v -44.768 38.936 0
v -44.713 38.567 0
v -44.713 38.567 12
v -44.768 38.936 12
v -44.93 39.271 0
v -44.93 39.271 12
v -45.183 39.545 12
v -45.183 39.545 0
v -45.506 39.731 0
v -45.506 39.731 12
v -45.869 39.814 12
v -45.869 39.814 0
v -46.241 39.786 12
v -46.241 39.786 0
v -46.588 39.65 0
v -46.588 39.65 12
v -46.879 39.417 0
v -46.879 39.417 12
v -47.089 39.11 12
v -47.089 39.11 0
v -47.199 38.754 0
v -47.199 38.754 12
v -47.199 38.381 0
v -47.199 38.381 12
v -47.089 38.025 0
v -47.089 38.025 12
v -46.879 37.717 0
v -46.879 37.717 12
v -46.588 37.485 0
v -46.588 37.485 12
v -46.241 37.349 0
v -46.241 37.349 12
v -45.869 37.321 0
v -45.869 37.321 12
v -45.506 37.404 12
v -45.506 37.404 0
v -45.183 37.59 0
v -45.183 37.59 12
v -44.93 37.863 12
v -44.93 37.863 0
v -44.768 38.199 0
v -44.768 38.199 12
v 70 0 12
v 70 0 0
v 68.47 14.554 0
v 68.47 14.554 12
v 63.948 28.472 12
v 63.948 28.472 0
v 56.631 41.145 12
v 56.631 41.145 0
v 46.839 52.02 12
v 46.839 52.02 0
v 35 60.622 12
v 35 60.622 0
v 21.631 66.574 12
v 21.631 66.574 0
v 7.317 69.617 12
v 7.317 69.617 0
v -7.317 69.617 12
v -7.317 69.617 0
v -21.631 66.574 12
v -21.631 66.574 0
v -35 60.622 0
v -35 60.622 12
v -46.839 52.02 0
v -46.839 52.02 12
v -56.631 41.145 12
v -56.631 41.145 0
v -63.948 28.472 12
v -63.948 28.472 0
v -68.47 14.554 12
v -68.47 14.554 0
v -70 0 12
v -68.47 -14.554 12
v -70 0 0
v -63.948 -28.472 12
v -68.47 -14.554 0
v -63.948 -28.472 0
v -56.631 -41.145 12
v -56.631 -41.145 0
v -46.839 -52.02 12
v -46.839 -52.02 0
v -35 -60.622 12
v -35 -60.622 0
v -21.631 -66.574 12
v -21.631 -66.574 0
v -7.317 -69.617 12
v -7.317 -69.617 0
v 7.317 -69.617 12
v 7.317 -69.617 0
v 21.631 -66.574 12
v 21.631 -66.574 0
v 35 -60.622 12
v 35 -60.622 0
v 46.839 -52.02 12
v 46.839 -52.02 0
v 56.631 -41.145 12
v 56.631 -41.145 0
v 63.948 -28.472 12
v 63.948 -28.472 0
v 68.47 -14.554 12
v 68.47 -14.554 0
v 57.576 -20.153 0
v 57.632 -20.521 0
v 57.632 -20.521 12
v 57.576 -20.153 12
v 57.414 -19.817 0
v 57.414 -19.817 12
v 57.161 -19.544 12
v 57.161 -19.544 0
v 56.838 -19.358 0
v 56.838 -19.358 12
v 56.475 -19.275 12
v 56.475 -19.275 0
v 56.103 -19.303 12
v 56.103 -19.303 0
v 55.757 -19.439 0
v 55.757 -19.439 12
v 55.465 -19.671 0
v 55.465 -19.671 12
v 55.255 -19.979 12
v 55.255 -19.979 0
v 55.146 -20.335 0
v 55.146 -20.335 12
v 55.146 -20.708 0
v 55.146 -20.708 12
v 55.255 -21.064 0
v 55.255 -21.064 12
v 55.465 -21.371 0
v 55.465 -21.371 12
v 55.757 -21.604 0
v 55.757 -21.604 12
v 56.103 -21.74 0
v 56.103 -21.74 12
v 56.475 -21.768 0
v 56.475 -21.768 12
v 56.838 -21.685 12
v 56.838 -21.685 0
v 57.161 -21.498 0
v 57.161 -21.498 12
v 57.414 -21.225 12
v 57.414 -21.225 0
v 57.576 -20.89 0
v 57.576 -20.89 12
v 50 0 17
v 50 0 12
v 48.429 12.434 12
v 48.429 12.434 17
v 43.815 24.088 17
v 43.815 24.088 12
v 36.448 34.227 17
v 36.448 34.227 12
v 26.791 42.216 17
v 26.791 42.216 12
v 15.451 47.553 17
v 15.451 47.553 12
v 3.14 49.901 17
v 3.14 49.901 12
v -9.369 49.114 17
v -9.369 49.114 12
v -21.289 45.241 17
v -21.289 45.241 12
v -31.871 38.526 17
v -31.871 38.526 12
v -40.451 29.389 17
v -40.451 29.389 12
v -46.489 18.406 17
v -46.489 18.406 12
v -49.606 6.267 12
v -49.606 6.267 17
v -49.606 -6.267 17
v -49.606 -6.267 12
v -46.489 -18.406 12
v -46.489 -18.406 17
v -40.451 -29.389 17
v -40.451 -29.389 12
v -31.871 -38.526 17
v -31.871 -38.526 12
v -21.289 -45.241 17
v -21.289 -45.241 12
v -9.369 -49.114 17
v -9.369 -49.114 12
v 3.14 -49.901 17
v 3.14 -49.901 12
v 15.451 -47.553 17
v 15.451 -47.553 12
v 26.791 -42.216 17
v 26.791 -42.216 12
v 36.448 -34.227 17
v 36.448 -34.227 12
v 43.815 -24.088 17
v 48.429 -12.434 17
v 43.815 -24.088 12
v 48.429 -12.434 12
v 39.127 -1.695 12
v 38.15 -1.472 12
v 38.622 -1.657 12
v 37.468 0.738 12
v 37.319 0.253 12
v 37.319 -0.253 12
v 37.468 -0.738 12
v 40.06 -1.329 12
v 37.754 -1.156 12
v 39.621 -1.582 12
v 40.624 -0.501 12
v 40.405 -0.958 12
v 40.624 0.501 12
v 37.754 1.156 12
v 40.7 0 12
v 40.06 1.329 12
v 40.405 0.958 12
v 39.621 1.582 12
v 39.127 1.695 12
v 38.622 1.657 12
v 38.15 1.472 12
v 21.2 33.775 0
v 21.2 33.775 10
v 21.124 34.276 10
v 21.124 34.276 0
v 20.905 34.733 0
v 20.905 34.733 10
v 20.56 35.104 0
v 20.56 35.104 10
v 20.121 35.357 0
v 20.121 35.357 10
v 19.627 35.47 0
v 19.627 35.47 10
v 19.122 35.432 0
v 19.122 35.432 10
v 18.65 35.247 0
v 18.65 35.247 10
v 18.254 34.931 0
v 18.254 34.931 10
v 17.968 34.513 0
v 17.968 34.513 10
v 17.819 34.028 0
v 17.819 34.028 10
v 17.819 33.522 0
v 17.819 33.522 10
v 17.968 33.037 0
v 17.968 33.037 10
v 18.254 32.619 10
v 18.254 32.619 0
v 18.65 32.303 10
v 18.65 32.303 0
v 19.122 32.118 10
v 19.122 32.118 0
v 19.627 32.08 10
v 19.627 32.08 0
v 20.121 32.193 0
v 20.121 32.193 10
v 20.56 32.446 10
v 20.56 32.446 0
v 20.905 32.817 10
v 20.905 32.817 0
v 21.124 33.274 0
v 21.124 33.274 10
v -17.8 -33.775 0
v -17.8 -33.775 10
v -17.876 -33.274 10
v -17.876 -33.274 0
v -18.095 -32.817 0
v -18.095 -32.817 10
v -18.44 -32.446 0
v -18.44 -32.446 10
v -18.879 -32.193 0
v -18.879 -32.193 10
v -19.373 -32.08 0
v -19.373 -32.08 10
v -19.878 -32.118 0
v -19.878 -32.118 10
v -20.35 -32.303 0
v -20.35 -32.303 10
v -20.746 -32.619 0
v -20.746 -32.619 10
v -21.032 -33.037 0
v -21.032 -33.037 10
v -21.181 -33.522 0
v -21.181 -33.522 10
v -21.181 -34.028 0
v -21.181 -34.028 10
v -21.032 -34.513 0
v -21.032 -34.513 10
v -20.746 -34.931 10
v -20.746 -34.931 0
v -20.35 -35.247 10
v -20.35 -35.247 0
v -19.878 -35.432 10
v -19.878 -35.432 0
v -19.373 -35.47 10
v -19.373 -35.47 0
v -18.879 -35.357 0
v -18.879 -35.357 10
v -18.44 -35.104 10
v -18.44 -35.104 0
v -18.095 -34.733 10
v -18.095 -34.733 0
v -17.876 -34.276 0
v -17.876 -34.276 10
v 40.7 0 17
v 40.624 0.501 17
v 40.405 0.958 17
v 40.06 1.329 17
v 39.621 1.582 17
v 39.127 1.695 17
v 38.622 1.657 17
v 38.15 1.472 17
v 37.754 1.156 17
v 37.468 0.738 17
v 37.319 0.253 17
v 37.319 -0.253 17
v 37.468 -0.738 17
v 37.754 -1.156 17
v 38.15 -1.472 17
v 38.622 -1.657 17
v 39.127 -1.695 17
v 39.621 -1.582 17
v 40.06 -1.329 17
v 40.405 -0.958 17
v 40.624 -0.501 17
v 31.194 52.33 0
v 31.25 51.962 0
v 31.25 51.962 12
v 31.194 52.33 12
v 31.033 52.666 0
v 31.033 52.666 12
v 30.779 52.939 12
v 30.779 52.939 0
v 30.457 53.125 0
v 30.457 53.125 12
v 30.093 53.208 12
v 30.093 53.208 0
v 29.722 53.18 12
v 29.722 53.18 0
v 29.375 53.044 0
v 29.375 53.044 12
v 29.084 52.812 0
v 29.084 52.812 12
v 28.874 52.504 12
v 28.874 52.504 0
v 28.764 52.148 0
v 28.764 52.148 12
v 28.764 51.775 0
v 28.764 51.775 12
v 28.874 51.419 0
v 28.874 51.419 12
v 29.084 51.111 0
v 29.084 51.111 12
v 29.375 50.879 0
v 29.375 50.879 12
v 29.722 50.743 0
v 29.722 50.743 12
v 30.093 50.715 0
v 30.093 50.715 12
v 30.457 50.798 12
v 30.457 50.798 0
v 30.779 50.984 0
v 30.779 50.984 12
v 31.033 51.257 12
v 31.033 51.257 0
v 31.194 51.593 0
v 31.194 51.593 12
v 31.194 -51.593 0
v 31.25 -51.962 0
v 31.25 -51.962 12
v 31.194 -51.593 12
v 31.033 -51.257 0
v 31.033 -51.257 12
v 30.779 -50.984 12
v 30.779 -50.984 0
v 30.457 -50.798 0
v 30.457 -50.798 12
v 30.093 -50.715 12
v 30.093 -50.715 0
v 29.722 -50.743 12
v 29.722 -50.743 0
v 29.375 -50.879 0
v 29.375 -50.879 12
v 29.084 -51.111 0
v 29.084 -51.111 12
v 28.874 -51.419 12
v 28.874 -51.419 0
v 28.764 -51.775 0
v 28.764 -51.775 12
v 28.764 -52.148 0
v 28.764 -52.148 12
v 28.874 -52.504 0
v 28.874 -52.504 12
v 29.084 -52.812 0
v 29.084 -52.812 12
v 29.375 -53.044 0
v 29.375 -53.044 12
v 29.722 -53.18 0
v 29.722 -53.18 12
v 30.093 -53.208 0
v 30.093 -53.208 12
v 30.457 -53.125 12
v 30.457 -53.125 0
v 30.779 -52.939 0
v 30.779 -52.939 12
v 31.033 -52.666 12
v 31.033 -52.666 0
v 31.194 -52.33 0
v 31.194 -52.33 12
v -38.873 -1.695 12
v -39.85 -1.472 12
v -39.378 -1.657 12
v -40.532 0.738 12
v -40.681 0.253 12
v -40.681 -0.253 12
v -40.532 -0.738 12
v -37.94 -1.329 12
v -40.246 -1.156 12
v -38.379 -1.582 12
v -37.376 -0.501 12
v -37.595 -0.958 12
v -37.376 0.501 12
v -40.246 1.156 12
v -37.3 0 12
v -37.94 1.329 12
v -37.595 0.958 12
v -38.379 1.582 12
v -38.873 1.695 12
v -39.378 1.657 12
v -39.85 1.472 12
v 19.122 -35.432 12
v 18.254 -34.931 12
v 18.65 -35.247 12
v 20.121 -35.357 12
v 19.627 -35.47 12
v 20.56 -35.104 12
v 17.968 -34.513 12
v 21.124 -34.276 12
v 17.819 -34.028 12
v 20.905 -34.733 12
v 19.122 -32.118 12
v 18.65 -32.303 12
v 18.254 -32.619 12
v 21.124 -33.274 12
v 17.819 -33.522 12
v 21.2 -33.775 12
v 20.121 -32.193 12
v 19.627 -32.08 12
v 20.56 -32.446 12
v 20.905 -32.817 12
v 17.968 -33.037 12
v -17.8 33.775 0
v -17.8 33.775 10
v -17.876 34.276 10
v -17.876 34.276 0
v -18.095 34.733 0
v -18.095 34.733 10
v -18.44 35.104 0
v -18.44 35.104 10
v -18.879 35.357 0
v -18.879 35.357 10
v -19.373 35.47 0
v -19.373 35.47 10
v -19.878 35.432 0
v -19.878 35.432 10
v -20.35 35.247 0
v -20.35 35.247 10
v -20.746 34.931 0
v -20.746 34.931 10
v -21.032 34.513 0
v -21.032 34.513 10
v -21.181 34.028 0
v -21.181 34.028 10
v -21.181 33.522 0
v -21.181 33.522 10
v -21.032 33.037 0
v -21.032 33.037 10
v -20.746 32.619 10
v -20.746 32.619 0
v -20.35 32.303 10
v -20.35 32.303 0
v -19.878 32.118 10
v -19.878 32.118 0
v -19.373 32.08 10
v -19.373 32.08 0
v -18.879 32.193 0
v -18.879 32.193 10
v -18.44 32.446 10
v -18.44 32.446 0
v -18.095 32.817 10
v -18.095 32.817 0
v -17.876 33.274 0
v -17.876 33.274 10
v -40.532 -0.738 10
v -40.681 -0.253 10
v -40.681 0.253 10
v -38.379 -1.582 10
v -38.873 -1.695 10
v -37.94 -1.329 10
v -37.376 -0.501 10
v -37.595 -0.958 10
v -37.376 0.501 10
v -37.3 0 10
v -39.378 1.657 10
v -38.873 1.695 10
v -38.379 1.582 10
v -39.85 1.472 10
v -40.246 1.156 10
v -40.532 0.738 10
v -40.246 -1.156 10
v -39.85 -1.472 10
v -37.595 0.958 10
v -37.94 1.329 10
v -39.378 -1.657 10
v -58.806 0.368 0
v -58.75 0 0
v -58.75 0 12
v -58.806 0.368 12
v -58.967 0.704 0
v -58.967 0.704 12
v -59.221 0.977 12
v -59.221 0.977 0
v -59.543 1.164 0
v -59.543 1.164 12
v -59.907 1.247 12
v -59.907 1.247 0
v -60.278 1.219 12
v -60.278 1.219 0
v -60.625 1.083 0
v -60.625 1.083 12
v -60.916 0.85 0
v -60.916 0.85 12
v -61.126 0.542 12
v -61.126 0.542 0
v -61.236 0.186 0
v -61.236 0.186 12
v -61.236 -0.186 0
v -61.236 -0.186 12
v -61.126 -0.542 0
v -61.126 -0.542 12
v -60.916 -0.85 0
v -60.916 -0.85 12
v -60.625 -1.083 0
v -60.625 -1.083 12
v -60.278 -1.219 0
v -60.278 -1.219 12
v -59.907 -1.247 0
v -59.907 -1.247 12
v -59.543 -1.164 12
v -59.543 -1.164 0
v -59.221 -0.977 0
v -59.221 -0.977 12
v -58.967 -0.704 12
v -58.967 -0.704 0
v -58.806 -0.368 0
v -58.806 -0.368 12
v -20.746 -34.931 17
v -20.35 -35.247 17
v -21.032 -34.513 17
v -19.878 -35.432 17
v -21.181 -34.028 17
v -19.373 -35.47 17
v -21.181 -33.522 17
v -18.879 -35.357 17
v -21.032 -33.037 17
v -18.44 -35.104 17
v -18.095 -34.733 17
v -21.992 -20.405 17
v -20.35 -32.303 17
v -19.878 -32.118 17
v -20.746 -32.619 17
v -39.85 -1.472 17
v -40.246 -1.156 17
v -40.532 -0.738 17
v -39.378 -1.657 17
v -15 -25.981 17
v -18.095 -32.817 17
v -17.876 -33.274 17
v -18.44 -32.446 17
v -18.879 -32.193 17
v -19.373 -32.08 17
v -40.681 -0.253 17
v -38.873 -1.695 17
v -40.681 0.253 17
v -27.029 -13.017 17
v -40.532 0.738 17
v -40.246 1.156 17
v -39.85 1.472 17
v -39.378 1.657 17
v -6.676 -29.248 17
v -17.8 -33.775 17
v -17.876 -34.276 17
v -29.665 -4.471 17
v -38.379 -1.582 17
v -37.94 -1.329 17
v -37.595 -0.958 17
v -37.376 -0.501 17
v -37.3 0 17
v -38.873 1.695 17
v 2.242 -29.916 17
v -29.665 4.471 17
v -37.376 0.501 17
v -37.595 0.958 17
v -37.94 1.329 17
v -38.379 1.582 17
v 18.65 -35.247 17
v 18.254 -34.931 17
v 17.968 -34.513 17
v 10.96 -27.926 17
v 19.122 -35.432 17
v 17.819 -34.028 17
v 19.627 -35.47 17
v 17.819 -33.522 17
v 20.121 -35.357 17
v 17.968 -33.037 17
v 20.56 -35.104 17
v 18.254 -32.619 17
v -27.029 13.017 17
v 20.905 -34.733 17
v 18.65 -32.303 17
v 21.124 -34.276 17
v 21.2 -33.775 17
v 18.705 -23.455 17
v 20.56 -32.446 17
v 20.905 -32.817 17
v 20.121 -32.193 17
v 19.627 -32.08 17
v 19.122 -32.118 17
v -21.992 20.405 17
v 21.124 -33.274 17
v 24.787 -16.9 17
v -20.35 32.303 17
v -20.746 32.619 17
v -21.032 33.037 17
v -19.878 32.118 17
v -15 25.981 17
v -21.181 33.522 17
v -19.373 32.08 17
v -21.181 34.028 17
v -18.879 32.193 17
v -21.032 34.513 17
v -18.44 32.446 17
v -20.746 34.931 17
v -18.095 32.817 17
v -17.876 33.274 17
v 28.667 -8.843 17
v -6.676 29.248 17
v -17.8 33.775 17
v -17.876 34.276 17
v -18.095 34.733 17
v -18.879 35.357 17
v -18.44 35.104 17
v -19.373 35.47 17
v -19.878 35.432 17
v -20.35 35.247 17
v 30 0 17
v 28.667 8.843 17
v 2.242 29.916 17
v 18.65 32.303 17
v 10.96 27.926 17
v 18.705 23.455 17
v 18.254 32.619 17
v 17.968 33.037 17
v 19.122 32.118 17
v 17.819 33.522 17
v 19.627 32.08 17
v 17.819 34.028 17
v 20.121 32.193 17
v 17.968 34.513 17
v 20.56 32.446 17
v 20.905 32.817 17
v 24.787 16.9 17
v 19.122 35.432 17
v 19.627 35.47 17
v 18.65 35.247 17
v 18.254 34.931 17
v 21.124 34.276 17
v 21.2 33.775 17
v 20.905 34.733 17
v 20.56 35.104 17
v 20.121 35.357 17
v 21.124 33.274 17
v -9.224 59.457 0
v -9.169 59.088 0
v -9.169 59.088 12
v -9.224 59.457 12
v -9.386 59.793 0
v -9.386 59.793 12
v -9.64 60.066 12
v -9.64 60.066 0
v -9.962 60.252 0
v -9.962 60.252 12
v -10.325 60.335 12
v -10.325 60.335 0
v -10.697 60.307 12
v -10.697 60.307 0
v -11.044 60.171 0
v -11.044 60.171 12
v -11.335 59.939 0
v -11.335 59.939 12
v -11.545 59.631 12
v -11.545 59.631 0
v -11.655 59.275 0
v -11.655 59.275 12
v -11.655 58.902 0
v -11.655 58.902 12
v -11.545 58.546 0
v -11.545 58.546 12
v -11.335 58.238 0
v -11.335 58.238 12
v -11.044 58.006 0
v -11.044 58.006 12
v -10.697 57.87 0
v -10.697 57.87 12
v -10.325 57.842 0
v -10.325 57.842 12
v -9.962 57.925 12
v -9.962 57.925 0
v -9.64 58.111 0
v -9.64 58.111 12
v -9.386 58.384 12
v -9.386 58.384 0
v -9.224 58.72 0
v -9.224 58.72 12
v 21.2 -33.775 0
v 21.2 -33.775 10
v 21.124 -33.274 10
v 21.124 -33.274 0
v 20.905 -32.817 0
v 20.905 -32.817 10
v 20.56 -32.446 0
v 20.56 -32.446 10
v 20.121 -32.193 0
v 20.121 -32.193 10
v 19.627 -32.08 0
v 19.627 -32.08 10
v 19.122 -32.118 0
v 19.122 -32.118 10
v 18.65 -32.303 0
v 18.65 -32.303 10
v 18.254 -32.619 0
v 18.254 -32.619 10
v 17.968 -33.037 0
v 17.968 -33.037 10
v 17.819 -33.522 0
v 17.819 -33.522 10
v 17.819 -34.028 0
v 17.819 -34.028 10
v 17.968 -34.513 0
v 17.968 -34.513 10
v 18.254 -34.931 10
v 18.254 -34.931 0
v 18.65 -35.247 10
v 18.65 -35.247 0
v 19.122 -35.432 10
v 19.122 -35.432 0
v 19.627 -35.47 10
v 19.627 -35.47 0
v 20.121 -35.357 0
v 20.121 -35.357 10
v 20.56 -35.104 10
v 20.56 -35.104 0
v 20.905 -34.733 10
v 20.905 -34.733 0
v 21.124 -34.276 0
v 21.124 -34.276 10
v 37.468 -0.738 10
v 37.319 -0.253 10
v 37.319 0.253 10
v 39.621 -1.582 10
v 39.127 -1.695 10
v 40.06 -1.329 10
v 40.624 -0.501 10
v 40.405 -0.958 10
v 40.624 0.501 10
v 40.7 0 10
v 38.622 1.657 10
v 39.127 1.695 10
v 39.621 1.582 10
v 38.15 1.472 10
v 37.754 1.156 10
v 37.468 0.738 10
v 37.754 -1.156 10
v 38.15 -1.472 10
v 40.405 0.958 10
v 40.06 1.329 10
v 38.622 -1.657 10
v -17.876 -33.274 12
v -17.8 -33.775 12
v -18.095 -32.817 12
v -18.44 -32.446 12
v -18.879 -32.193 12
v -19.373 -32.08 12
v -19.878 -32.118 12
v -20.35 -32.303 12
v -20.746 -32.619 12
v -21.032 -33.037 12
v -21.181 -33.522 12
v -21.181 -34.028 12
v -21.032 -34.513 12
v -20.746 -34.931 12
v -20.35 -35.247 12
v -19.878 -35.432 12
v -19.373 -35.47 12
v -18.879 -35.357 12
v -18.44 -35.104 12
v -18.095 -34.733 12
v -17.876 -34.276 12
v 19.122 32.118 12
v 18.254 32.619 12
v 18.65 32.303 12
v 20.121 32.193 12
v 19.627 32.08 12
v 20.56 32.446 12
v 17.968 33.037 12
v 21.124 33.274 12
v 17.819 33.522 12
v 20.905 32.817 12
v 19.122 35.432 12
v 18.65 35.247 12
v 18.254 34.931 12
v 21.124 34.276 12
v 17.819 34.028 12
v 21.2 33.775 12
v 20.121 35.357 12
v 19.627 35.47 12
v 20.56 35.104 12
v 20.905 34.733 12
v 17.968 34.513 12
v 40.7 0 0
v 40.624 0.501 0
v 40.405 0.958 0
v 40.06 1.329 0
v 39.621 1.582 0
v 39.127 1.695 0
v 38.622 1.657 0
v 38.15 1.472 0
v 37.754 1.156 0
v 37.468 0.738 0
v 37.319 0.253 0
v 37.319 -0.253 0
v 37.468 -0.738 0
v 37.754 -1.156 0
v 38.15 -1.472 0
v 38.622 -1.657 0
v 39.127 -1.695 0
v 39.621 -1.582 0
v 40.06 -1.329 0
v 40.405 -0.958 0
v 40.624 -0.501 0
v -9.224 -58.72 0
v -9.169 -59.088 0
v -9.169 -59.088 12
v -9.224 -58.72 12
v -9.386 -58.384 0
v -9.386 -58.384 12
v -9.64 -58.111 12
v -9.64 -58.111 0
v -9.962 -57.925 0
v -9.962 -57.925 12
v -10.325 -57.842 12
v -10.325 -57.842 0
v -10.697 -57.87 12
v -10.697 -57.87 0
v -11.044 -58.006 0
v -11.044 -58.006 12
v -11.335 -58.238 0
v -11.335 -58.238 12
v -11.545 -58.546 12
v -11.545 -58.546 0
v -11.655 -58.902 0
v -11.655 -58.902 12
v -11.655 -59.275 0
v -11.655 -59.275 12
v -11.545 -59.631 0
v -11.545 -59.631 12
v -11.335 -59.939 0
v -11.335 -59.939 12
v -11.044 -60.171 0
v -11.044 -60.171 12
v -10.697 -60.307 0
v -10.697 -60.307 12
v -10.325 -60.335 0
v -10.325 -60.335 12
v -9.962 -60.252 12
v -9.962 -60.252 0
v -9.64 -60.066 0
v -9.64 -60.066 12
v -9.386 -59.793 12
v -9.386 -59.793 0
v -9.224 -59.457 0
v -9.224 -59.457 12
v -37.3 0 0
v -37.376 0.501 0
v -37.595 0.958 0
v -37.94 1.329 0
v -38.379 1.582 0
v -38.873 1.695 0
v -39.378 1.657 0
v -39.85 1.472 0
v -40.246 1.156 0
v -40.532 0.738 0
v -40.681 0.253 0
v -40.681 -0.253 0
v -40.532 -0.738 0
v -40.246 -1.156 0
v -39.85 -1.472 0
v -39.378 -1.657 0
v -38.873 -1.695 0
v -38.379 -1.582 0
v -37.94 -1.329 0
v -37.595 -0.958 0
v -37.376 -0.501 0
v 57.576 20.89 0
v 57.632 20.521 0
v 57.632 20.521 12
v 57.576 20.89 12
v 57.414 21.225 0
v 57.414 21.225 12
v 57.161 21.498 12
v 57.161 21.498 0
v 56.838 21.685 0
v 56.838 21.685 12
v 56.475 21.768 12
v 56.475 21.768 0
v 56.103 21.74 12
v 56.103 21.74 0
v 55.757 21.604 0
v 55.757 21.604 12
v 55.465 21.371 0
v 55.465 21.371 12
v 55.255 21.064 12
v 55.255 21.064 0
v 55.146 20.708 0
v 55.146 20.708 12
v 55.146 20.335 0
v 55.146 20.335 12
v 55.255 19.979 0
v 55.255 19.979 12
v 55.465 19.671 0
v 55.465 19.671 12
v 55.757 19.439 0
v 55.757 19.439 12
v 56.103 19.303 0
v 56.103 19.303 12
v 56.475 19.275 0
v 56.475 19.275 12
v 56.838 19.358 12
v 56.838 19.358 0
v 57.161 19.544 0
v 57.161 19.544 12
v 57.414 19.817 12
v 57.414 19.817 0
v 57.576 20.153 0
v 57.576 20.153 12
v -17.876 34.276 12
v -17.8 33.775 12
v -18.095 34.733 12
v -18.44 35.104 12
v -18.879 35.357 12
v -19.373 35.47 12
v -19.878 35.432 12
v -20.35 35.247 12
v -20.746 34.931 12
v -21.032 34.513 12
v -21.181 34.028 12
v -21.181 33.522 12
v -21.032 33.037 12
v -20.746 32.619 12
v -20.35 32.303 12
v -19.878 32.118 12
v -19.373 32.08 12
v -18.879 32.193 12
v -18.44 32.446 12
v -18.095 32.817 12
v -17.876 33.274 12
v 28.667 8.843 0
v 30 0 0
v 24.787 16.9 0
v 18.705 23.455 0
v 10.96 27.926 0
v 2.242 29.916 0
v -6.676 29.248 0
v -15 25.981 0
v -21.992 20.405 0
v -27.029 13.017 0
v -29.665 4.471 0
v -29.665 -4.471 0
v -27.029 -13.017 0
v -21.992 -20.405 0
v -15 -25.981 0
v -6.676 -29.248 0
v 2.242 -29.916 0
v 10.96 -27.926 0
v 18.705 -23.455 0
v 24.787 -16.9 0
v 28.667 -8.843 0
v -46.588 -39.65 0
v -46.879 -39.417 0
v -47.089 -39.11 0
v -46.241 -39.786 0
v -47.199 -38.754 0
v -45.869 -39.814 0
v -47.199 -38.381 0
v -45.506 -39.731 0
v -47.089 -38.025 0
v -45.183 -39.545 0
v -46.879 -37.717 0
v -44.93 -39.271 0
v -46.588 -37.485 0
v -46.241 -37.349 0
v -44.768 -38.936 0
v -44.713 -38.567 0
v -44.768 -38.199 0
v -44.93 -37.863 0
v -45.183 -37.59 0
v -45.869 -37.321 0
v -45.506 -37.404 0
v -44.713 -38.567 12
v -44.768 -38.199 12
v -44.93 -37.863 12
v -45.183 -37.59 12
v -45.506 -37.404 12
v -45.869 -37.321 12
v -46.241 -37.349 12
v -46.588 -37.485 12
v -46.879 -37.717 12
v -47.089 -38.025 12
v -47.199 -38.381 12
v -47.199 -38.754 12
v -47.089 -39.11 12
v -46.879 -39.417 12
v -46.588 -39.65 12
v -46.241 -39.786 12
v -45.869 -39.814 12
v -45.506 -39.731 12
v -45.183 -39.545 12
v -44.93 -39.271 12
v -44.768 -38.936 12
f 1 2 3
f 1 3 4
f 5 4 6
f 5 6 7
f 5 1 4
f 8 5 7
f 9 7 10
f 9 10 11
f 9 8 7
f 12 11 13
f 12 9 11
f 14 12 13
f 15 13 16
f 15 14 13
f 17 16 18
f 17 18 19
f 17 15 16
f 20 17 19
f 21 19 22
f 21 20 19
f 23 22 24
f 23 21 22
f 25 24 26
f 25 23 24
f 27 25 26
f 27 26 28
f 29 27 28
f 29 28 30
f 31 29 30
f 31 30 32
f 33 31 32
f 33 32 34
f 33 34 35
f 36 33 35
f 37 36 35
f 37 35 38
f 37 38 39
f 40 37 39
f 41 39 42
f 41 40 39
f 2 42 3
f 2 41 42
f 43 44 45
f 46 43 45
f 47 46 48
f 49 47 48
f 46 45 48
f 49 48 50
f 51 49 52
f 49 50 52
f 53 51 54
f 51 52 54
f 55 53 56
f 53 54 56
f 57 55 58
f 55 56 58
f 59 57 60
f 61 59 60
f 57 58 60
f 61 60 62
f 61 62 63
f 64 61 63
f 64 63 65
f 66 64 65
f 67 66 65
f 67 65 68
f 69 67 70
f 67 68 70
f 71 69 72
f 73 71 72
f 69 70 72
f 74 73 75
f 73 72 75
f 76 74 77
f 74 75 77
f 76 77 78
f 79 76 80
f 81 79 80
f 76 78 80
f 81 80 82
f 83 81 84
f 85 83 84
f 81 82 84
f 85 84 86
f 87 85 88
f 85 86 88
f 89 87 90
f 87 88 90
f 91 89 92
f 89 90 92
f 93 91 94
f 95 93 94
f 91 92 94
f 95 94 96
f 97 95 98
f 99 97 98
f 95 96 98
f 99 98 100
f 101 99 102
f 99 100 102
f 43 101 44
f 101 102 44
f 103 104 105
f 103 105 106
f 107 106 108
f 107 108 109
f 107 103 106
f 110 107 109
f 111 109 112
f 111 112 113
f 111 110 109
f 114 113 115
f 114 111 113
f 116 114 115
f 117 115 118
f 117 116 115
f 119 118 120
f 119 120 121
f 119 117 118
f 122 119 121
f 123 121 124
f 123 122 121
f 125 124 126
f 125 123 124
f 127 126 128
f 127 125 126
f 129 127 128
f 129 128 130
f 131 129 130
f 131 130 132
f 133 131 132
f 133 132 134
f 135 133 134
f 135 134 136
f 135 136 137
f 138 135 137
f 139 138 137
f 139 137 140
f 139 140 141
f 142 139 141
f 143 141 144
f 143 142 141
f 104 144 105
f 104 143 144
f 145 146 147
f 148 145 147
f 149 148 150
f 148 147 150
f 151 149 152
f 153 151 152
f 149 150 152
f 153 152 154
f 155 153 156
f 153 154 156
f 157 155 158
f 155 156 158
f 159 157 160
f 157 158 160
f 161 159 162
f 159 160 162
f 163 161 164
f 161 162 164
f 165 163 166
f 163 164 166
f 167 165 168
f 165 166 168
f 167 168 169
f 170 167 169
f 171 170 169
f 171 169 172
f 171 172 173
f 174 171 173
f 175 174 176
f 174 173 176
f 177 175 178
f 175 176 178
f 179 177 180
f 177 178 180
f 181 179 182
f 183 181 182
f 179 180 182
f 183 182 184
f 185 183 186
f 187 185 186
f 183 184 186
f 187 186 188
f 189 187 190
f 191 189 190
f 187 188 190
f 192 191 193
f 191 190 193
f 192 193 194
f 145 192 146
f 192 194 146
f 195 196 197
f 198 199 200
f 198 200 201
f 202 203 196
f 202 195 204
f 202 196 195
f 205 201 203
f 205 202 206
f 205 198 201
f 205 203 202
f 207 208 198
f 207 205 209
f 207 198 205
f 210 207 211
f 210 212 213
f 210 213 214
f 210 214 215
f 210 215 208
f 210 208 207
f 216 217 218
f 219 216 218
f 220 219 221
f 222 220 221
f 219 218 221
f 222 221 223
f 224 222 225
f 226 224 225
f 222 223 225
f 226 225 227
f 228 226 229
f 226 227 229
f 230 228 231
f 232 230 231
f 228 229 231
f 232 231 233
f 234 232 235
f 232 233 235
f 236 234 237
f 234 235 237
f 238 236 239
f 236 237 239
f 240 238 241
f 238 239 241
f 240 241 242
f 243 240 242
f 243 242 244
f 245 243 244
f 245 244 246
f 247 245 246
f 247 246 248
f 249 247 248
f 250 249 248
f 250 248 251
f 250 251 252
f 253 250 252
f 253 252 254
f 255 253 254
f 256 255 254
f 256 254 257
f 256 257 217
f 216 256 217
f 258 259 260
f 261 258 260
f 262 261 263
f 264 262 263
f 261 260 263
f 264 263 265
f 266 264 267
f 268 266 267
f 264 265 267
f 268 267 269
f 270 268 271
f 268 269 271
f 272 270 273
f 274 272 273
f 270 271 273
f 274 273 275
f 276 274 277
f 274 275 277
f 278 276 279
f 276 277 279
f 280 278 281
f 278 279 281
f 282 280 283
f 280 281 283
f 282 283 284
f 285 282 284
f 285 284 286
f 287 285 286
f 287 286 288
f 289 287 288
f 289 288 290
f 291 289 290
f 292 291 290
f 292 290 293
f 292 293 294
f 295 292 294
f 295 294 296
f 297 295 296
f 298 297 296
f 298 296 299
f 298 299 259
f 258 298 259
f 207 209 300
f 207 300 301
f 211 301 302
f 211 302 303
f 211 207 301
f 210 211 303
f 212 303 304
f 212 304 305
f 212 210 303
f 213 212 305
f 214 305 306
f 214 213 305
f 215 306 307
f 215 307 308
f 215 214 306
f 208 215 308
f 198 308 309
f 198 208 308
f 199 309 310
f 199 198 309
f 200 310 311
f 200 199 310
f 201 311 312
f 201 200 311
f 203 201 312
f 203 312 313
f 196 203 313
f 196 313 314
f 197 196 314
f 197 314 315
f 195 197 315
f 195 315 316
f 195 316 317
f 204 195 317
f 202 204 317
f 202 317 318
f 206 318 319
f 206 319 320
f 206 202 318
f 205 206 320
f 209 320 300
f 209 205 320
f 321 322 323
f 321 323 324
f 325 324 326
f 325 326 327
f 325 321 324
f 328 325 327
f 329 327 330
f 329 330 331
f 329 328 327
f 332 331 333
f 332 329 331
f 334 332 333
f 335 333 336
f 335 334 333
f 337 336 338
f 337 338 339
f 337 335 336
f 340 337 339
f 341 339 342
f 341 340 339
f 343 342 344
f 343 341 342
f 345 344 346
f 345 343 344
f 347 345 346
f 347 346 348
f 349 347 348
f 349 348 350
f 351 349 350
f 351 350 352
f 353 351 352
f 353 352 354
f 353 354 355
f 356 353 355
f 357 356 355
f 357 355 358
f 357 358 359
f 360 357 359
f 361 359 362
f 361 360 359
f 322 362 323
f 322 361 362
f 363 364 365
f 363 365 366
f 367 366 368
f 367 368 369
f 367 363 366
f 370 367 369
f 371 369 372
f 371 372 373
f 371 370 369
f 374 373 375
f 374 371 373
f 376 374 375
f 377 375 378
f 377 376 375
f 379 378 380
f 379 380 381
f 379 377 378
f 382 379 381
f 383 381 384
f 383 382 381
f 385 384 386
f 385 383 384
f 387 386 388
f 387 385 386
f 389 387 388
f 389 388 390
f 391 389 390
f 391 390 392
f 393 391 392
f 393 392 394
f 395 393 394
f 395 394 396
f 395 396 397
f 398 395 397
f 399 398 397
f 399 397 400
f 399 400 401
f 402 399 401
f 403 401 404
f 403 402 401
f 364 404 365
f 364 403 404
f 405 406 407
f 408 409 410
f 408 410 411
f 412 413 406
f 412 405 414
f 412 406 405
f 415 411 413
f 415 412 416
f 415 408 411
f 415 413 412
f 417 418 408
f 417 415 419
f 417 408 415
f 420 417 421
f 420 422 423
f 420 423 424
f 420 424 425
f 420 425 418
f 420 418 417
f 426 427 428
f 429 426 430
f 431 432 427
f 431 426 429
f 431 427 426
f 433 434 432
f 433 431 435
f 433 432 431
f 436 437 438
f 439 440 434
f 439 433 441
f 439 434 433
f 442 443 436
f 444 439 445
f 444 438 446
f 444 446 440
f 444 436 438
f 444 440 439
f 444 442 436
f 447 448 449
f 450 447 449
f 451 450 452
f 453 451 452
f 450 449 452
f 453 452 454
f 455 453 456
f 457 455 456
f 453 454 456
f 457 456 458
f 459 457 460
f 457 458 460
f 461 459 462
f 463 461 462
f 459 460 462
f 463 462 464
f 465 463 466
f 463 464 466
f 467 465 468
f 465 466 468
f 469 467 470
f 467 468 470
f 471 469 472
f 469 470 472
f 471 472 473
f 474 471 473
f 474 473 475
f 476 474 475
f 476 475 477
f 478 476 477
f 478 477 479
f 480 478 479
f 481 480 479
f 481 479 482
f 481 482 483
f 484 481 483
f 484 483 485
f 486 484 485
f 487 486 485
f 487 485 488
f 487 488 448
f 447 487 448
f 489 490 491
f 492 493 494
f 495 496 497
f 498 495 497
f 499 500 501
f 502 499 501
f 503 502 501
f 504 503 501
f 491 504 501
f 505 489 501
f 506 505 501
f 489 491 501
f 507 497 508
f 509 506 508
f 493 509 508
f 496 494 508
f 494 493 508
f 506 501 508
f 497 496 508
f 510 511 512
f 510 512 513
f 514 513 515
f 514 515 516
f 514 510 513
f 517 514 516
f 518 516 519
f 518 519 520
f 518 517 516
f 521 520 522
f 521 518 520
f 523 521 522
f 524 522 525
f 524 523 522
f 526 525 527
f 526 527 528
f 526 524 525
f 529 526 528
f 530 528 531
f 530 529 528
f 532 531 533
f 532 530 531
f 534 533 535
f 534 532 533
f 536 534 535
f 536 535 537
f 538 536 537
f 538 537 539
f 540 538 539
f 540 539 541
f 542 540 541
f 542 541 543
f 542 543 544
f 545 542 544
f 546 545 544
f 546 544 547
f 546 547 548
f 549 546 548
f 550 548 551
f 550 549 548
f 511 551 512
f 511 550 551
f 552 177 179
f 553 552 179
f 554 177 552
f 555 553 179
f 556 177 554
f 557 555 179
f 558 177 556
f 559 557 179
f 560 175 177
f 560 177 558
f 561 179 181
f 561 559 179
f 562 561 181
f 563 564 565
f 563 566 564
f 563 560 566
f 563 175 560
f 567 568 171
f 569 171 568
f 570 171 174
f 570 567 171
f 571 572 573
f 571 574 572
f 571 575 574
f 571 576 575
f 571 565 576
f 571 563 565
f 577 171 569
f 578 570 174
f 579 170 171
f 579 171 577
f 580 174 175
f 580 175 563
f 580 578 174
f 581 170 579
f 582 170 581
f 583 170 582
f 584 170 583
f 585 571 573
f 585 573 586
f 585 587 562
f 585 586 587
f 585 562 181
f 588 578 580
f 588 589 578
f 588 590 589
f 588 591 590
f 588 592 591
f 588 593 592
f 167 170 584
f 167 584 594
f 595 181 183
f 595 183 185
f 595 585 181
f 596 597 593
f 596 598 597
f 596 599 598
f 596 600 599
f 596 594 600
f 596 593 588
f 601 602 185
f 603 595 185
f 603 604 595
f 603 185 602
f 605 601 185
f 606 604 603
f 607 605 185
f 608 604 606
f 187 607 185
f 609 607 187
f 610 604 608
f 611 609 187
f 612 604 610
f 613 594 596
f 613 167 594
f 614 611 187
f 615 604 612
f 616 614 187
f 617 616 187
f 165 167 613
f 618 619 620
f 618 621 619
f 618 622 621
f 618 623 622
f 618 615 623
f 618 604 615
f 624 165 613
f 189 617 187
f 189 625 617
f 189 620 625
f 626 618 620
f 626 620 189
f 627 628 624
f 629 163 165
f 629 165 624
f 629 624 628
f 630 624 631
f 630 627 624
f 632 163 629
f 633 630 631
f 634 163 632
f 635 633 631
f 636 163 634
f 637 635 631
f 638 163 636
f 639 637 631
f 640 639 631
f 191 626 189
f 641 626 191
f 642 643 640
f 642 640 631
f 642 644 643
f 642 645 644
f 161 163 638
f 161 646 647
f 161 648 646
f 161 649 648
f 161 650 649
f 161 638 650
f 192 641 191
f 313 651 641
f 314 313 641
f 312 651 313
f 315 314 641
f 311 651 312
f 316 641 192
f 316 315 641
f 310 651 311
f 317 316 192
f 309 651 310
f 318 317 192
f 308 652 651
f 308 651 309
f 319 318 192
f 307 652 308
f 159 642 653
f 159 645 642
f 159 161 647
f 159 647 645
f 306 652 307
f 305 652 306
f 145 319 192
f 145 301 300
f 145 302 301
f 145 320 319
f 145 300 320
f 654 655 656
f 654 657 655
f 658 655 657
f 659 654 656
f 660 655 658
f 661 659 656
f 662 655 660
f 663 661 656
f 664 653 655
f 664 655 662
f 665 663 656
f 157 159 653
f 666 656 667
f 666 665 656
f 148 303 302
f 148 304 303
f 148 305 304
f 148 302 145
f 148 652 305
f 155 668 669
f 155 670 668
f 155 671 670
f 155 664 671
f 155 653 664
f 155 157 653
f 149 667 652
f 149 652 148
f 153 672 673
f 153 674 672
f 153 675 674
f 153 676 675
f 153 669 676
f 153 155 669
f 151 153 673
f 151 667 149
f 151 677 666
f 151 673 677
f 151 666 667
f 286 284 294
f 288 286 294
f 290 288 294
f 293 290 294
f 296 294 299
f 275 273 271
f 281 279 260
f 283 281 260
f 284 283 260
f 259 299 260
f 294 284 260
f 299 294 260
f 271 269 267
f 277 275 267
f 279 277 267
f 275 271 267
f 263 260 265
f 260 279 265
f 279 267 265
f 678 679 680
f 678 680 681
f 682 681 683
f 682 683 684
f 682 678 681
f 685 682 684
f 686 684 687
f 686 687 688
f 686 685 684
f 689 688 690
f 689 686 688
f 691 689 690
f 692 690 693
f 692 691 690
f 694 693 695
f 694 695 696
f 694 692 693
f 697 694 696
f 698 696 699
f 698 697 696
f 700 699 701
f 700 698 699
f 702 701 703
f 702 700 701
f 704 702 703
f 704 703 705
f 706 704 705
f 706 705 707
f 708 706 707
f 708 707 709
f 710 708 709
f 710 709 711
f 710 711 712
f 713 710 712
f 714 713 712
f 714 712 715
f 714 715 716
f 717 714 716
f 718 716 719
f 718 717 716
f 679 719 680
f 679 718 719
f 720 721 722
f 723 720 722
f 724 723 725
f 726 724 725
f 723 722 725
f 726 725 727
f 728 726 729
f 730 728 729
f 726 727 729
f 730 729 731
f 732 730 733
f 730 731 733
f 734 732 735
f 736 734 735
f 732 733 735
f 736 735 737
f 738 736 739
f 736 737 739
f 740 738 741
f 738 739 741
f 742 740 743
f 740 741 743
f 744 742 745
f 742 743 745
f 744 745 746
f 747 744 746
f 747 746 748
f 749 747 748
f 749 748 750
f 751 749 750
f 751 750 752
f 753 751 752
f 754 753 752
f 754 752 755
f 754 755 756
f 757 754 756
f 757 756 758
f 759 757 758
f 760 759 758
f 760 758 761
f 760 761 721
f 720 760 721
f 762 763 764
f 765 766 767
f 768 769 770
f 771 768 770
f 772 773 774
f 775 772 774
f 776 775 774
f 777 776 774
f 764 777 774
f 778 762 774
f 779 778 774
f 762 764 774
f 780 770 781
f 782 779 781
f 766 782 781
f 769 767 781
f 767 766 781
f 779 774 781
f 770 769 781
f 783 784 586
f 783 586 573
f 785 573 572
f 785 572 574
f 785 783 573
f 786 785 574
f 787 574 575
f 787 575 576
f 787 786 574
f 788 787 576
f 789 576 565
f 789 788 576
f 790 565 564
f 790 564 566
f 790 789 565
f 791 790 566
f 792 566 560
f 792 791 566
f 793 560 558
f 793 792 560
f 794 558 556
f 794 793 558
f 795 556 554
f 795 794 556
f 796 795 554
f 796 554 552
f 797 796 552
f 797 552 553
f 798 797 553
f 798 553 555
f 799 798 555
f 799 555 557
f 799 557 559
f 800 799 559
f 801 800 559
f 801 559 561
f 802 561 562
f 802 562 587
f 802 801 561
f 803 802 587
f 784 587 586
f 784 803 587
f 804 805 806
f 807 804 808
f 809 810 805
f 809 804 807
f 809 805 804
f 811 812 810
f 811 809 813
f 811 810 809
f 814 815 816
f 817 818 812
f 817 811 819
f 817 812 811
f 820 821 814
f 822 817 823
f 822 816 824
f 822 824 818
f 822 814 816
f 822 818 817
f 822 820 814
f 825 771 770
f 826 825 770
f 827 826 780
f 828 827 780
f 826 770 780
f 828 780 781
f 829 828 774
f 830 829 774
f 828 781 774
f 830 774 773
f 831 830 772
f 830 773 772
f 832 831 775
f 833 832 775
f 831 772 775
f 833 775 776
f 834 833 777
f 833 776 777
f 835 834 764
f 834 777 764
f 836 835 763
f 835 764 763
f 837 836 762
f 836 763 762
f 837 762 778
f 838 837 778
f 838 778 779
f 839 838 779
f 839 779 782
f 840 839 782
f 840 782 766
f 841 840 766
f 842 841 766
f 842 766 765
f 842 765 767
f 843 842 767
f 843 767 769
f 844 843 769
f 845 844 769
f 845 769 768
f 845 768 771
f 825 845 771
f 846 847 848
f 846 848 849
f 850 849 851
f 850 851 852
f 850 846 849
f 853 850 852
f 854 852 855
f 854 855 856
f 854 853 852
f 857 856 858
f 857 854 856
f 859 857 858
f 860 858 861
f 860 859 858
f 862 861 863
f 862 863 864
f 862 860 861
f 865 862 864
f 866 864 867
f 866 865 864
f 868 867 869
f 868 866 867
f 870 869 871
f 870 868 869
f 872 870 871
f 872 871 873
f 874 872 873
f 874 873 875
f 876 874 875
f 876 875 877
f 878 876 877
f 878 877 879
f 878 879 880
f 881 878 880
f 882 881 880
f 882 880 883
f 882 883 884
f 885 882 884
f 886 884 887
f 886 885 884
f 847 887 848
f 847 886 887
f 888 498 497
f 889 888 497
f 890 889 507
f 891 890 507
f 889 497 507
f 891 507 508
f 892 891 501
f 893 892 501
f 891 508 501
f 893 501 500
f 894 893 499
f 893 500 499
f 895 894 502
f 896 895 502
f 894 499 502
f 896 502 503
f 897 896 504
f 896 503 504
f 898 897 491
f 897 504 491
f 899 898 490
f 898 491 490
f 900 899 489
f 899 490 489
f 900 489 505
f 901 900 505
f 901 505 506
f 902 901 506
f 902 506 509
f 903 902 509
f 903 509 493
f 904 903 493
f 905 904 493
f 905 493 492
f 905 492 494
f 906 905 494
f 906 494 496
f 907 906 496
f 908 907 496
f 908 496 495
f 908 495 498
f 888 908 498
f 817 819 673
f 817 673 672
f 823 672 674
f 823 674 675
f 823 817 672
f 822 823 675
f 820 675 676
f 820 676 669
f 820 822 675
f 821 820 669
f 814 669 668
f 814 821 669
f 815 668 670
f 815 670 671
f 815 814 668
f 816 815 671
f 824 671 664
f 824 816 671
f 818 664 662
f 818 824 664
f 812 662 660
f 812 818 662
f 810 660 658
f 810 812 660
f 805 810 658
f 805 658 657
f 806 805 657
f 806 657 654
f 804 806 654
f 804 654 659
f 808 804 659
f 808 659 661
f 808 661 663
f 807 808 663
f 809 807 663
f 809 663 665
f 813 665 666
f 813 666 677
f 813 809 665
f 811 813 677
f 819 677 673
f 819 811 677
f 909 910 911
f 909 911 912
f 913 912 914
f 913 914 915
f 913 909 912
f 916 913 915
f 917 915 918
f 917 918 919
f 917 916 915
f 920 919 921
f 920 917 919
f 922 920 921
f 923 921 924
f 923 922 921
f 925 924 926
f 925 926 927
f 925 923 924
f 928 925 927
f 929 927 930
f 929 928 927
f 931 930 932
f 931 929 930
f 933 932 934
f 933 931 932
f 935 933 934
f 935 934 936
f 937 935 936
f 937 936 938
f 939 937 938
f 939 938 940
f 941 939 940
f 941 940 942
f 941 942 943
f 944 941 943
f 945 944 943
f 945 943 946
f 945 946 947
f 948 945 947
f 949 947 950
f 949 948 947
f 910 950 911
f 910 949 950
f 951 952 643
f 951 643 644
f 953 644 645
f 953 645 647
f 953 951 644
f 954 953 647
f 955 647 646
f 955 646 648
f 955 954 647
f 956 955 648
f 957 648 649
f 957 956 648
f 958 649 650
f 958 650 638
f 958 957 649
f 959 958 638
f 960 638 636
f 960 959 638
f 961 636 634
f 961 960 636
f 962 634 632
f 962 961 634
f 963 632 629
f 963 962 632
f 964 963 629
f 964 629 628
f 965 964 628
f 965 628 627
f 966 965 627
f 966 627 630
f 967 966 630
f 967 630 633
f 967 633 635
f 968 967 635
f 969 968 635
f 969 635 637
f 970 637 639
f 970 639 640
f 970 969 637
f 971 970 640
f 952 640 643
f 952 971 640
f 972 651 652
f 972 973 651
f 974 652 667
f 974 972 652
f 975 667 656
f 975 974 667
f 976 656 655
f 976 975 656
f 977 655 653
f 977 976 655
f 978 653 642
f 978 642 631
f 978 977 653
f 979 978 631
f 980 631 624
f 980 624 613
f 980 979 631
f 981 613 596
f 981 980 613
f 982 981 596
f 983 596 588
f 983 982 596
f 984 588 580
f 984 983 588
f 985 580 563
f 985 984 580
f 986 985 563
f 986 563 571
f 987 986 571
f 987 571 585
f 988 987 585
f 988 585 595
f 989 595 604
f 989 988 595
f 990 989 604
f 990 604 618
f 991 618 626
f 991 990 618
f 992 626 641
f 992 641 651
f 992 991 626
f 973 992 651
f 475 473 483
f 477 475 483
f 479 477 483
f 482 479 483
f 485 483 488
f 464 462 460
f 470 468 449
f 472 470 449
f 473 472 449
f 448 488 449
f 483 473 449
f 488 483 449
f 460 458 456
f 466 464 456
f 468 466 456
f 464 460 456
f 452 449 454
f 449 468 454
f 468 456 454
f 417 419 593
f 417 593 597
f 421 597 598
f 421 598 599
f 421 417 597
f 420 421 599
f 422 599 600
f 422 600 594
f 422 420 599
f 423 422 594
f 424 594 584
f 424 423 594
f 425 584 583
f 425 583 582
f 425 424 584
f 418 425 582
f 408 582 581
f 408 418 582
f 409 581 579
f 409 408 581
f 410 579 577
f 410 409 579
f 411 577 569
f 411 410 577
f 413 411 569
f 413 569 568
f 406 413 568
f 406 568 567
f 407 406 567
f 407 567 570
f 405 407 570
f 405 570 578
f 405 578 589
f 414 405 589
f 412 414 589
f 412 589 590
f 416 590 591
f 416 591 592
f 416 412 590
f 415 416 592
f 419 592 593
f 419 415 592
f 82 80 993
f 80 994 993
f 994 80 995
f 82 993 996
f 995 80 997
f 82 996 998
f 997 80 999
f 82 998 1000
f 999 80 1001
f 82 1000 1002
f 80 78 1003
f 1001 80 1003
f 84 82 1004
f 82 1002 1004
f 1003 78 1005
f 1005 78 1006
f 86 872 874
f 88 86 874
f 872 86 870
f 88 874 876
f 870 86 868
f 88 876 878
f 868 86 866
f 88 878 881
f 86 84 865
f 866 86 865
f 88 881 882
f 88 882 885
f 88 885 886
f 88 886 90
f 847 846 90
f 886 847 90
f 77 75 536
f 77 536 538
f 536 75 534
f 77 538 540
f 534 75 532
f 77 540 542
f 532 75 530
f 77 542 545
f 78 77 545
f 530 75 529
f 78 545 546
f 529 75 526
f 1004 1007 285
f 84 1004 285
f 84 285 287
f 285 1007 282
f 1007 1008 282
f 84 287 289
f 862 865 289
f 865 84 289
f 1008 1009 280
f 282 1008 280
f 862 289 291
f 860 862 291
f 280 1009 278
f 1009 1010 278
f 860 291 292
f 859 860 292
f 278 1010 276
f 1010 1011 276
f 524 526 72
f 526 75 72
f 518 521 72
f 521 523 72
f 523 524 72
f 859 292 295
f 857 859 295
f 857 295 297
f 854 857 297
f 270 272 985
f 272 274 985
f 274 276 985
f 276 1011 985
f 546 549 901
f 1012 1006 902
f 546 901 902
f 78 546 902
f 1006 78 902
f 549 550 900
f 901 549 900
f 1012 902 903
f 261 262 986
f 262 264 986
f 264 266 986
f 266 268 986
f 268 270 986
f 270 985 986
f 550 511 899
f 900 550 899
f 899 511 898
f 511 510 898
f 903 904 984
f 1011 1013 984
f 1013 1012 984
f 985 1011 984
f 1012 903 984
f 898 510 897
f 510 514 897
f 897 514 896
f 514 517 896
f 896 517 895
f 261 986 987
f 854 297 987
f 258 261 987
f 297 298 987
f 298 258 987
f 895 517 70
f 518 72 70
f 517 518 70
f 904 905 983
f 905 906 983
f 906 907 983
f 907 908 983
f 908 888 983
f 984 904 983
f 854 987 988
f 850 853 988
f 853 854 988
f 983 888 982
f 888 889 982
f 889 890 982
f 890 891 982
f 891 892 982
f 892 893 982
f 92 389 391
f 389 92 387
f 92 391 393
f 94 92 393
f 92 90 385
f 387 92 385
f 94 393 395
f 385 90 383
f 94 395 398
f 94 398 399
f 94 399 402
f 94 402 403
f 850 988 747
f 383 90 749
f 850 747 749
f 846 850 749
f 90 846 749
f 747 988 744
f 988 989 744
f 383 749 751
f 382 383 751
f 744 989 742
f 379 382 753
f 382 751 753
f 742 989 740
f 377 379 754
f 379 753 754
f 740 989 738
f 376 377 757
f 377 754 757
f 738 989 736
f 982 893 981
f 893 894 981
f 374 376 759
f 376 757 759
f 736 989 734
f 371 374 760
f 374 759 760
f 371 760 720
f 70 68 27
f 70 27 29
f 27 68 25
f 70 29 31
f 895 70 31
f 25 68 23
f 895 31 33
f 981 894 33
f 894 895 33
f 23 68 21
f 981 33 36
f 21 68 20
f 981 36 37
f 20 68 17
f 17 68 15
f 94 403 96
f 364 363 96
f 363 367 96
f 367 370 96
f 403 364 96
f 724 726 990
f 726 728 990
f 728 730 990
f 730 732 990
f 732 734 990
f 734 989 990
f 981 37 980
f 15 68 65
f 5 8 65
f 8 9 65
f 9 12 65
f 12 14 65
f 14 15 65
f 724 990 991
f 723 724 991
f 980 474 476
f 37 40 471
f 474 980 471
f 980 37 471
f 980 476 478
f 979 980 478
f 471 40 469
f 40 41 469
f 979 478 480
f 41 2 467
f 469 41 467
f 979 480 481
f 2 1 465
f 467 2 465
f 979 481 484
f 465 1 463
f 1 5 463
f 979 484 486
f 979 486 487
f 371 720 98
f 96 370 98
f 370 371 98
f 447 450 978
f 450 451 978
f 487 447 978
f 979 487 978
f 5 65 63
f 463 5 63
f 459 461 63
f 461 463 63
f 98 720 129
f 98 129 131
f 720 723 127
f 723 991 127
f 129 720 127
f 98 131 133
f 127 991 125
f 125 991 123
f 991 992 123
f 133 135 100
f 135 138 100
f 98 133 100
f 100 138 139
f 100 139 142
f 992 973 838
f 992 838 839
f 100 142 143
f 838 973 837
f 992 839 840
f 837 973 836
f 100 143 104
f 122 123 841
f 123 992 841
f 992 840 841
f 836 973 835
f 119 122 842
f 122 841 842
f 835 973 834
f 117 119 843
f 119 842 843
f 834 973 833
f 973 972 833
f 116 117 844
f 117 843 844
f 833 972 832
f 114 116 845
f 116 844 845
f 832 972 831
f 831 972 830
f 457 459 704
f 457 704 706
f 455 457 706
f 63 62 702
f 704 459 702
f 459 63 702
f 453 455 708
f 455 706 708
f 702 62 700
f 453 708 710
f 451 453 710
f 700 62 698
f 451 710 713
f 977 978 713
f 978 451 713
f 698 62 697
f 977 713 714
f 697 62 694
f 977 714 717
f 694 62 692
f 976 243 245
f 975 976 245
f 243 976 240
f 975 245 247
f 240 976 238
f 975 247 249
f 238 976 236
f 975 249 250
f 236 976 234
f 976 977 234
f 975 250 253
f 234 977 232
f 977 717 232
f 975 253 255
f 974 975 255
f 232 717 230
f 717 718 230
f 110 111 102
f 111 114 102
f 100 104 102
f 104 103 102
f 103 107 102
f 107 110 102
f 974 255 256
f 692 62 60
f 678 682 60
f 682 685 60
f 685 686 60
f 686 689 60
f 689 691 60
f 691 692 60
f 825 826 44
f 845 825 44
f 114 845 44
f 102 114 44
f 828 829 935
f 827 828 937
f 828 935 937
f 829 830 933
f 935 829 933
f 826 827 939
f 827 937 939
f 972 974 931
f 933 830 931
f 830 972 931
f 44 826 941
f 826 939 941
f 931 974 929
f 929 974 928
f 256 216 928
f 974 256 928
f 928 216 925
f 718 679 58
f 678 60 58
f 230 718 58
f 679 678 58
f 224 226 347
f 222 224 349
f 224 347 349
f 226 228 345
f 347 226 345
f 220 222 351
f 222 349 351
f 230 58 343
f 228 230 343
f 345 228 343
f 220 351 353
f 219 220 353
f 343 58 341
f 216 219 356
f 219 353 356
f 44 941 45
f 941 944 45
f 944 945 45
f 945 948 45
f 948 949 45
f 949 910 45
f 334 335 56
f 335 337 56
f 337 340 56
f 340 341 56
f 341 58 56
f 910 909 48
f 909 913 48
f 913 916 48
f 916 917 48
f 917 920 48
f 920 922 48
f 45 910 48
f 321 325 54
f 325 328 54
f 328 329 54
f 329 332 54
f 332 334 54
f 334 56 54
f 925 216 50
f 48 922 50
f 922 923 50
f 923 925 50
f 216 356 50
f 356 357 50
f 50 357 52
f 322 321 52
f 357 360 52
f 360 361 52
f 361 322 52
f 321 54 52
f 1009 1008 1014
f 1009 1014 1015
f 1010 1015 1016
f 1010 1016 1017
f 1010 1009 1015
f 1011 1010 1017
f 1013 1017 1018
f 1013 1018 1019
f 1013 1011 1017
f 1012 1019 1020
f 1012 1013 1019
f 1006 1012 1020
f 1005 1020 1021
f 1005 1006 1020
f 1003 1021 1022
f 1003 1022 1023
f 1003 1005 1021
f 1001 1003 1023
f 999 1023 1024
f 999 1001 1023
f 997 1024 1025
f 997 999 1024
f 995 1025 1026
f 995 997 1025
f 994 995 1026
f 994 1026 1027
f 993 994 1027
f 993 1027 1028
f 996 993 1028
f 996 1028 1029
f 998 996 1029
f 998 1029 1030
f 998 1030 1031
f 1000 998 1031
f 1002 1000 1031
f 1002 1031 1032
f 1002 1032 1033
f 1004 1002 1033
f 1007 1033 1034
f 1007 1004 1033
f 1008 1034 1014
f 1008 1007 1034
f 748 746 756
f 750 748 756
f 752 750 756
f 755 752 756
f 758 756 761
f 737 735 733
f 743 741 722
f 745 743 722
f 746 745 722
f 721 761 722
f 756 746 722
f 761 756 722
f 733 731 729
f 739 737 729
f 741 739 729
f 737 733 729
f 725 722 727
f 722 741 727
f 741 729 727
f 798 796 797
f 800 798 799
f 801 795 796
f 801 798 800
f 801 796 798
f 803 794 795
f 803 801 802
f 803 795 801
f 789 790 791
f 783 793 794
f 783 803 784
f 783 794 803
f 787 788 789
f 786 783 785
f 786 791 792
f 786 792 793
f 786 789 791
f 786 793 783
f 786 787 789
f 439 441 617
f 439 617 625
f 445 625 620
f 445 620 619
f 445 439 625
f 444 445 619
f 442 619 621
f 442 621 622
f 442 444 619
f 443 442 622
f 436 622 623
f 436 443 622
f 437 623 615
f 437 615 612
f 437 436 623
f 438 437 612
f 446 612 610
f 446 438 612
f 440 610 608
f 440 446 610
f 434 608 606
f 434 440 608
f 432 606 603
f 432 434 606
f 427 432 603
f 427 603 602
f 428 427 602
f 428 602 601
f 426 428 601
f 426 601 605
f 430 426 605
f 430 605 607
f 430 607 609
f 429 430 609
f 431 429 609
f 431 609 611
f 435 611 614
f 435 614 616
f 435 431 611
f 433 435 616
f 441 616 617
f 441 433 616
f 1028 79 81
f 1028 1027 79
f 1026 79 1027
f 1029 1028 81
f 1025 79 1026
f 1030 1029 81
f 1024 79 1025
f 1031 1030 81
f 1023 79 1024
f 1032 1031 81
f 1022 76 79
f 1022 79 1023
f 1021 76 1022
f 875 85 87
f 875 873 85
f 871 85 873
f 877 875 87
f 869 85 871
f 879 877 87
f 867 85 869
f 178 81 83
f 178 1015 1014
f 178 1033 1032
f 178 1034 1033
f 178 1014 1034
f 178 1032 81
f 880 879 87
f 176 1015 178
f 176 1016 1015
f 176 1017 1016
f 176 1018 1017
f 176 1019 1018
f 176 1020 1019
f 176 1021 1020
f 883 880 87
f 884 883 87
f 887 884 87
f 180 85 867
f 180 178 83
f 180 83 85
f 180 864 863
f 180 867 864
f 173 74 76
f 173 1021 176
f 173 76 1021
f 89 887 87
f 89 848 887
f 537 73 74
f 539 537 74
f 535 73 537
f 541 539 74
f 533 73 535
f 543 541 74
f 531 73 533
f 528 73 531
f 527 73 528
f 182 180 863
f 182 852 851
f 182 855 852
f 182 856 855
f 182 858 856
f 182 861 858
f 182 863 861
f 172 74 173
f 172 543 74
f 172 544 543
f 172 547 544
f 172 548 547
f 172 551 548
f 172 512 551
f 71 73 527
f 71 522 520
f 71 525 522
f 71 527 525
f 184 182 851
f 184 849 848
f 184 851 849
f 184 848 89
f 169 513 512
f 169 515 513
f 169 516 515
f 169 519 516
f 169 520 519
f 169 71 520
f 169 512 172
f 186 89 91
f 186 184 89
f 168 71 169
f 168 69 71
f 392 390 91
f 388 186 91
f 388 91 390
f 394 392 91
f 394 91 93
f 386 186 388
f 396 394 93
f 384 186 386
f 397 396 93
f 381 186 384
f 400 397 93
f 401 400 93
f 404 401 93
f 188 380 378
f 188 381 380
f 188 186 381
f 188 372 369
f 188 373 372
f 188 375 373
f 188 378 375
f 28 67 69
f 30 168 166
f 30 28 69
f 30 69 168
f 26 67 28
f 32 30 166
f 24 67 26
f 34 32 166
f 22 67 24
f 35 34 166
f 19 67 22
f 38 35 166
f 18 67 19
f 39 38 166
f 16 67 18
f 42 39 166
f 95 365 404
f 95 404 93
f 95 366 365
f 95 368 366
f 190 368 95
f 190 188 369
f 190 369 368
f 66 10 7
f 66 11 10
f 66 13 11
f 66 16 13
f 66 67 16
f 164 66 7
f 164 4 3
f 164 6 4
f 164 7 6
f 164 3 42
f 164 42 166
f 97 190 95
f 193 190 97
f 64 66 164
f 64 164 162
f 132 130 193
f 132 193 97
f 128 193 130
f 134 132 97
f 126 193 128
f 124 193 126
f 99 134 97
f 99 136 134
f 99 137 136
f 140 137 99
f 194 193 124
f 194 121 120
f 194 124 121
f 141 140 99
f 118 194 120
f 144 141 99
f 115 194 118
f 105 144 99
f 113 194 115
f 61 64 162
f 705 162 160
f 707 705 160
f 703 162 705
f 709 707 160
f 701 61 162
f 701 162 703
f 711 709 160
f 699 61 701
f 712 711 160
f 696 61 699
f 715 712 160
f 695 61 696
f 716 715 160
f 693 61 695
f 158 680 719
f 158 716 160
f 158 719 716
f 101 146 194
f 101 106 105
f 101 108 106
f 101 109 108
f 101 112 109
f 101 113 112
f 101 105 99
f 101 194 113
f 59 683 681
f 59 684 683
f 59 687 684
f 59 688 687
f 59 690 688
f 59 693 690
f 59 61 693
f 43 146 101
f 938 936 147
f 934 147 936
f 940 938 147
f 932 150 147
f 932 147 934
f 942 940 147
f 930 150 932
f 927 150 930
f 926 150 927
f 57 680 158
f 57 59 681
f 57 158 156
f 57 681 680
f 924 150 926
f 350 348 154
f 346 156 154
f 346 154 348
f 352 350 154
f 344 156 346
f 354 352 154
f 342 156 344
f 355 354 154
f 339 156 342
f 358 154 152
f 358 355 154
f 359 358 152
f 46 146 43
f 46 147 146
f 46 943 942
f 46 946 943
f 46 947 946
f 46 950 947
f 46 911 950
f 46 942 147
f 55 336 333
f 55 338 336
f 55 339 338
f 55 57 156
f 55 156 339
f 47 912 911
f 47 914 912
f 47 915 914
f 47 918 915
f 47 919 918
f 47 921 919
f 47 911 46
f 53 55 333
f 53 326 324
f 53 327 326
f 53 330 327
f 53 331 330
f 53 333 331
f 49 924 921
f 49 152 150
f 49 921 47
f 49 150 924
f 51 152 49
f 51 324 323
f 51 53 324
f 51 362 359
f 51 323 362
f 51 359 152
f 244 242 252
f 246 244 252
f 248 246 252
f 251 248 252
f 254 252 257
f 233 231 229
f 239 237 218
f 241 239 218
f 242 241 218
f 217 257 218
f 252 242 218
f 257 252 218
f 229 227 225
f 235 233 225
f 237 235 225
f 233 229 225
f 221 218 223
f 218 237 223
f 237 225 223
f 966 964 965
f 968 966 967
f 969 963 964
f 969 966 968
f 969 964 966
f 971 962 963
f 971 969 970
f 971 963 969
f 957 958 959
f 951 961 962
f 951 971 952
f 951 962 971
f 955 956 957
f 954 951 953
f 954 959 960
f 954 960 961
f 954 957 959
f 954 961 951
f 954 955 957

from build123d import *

# Parameters (mm, degrees)
SKETCH_R      = 70
SKETCH_R_2    = 30
SKETCH_R_3    = 1.25
PAD_DEPTH     = 12
SKETCH001_R   = 50
SKETCH001_R_2 = 30
SKETCH001_R_3 = 1.7
PAD001_DEPTH  = 5
SKETCH003_R   = 1.7
POCKET_DEPTH  = 10.001


with BuildPart() as part:
    # Sketch → Pad (new body)
    with BuildSketch(Plane.XY):
        Circle(SKETCH_R)
        Circle(SKETCH_R_2, mode=Mode.SUBTRACT)
        with Locations((-60, 0)):
            Circle(SKETCH_R_3, mode=Mode.SUBTRACT)
        with Locations((-45.962667, 38.567257)):
            Circle(SKETCH_R_3, mode=Mode.SUBTRACT)
        with Locations((-45.962667, -38.567257)):
            Circle(SKETCH_R_3, mode=Mode.SUBTRACT)
        with Locations((-10.418891, -59.088465)):
            Circle(SKETCH_R_3, mode=Mode.SUBTRACT)
        with Locations((30, -51.961524)):
            Circle(SKETCH_R_3, mode=Mode.SUBTRACT)
        with Locations((56.381557, -20.521209)):
            Circle(SKETCH_R_3, mode=Mode.SUBTRACT)
        with Locations((56.381557, 20.521209)):
            Circle(SKETCH_R_3, mode=Mode.SUBTRACT)
        with Locations((30, 51.961524)):
            Circle(SKETCH_R_3, mode=Mode.SUBTRACT)
        with Locations((-10.418891, 59.088465)):
            Circle(SKETCH_R_3, mode=Mode.SUBTRACT)
    extrude(amount=PAD_DEPTH)

    # Sketch001 (on Face13 of Pad) → Pad001 (join)
    with BuildSketch(Plane.XY.offset(12)):
        Circle(SKETCH001_R)
        Circle(SKETCH001_R_2, mode=Mode.SUBTRACT)
        with Locations((-19.5, 33.774991)):
            Circle(SKETCH001_R_3, mode=Mode.SUBTRACT)
        with Locations((19.5, 33.774991)):
            Circle(SKETCH001_R_3, mode=Mode.SUBTRACT)
        with Locations((39, 0)):
            Circle(SKETCH001_R_3, mode=Mode.SUBTRACT)
        with Locations((-39, 0)):
            Circle(SKETCH001_R_3, mode=Mode.SUBTRACT)
        with Locations((-19.5, -33.774991)):
            Circle(SKETCH001_R_3, mode=Mode.SUBTRACT)
        with Locations((19.5, -33.774991)):
            Circle(SKETCH001_R_3, mode=Mode.SUBTRACT)
    extrude(amount=PAD001_DEPTH)

    # Sketch003 → Pocket (cut, through all)
    with BuildSketch(Plane.XY.offset(10)):
        with Locations((-19.5, 33.774991)):
            Circle(SKETCH003_R)
        with Locations((19.5, 33.774991)):
            Circle(SKETCH003_R)
        with Locations((39, 0)):
            Circle(SKETCH003_R)
        with Locations((-39, 0)):
            Circle(SKETCH003_R)
        with Locations((-19.5, -33.774991)):
            Circle(SKETCH003_R)
        with Locations((19.5, -33.774991)):
            Circle(SKETCH003_R)
    extrude(amount=-POCKET_DEPTH, mode=Mode.SUBTRACT)


solid = part.part
